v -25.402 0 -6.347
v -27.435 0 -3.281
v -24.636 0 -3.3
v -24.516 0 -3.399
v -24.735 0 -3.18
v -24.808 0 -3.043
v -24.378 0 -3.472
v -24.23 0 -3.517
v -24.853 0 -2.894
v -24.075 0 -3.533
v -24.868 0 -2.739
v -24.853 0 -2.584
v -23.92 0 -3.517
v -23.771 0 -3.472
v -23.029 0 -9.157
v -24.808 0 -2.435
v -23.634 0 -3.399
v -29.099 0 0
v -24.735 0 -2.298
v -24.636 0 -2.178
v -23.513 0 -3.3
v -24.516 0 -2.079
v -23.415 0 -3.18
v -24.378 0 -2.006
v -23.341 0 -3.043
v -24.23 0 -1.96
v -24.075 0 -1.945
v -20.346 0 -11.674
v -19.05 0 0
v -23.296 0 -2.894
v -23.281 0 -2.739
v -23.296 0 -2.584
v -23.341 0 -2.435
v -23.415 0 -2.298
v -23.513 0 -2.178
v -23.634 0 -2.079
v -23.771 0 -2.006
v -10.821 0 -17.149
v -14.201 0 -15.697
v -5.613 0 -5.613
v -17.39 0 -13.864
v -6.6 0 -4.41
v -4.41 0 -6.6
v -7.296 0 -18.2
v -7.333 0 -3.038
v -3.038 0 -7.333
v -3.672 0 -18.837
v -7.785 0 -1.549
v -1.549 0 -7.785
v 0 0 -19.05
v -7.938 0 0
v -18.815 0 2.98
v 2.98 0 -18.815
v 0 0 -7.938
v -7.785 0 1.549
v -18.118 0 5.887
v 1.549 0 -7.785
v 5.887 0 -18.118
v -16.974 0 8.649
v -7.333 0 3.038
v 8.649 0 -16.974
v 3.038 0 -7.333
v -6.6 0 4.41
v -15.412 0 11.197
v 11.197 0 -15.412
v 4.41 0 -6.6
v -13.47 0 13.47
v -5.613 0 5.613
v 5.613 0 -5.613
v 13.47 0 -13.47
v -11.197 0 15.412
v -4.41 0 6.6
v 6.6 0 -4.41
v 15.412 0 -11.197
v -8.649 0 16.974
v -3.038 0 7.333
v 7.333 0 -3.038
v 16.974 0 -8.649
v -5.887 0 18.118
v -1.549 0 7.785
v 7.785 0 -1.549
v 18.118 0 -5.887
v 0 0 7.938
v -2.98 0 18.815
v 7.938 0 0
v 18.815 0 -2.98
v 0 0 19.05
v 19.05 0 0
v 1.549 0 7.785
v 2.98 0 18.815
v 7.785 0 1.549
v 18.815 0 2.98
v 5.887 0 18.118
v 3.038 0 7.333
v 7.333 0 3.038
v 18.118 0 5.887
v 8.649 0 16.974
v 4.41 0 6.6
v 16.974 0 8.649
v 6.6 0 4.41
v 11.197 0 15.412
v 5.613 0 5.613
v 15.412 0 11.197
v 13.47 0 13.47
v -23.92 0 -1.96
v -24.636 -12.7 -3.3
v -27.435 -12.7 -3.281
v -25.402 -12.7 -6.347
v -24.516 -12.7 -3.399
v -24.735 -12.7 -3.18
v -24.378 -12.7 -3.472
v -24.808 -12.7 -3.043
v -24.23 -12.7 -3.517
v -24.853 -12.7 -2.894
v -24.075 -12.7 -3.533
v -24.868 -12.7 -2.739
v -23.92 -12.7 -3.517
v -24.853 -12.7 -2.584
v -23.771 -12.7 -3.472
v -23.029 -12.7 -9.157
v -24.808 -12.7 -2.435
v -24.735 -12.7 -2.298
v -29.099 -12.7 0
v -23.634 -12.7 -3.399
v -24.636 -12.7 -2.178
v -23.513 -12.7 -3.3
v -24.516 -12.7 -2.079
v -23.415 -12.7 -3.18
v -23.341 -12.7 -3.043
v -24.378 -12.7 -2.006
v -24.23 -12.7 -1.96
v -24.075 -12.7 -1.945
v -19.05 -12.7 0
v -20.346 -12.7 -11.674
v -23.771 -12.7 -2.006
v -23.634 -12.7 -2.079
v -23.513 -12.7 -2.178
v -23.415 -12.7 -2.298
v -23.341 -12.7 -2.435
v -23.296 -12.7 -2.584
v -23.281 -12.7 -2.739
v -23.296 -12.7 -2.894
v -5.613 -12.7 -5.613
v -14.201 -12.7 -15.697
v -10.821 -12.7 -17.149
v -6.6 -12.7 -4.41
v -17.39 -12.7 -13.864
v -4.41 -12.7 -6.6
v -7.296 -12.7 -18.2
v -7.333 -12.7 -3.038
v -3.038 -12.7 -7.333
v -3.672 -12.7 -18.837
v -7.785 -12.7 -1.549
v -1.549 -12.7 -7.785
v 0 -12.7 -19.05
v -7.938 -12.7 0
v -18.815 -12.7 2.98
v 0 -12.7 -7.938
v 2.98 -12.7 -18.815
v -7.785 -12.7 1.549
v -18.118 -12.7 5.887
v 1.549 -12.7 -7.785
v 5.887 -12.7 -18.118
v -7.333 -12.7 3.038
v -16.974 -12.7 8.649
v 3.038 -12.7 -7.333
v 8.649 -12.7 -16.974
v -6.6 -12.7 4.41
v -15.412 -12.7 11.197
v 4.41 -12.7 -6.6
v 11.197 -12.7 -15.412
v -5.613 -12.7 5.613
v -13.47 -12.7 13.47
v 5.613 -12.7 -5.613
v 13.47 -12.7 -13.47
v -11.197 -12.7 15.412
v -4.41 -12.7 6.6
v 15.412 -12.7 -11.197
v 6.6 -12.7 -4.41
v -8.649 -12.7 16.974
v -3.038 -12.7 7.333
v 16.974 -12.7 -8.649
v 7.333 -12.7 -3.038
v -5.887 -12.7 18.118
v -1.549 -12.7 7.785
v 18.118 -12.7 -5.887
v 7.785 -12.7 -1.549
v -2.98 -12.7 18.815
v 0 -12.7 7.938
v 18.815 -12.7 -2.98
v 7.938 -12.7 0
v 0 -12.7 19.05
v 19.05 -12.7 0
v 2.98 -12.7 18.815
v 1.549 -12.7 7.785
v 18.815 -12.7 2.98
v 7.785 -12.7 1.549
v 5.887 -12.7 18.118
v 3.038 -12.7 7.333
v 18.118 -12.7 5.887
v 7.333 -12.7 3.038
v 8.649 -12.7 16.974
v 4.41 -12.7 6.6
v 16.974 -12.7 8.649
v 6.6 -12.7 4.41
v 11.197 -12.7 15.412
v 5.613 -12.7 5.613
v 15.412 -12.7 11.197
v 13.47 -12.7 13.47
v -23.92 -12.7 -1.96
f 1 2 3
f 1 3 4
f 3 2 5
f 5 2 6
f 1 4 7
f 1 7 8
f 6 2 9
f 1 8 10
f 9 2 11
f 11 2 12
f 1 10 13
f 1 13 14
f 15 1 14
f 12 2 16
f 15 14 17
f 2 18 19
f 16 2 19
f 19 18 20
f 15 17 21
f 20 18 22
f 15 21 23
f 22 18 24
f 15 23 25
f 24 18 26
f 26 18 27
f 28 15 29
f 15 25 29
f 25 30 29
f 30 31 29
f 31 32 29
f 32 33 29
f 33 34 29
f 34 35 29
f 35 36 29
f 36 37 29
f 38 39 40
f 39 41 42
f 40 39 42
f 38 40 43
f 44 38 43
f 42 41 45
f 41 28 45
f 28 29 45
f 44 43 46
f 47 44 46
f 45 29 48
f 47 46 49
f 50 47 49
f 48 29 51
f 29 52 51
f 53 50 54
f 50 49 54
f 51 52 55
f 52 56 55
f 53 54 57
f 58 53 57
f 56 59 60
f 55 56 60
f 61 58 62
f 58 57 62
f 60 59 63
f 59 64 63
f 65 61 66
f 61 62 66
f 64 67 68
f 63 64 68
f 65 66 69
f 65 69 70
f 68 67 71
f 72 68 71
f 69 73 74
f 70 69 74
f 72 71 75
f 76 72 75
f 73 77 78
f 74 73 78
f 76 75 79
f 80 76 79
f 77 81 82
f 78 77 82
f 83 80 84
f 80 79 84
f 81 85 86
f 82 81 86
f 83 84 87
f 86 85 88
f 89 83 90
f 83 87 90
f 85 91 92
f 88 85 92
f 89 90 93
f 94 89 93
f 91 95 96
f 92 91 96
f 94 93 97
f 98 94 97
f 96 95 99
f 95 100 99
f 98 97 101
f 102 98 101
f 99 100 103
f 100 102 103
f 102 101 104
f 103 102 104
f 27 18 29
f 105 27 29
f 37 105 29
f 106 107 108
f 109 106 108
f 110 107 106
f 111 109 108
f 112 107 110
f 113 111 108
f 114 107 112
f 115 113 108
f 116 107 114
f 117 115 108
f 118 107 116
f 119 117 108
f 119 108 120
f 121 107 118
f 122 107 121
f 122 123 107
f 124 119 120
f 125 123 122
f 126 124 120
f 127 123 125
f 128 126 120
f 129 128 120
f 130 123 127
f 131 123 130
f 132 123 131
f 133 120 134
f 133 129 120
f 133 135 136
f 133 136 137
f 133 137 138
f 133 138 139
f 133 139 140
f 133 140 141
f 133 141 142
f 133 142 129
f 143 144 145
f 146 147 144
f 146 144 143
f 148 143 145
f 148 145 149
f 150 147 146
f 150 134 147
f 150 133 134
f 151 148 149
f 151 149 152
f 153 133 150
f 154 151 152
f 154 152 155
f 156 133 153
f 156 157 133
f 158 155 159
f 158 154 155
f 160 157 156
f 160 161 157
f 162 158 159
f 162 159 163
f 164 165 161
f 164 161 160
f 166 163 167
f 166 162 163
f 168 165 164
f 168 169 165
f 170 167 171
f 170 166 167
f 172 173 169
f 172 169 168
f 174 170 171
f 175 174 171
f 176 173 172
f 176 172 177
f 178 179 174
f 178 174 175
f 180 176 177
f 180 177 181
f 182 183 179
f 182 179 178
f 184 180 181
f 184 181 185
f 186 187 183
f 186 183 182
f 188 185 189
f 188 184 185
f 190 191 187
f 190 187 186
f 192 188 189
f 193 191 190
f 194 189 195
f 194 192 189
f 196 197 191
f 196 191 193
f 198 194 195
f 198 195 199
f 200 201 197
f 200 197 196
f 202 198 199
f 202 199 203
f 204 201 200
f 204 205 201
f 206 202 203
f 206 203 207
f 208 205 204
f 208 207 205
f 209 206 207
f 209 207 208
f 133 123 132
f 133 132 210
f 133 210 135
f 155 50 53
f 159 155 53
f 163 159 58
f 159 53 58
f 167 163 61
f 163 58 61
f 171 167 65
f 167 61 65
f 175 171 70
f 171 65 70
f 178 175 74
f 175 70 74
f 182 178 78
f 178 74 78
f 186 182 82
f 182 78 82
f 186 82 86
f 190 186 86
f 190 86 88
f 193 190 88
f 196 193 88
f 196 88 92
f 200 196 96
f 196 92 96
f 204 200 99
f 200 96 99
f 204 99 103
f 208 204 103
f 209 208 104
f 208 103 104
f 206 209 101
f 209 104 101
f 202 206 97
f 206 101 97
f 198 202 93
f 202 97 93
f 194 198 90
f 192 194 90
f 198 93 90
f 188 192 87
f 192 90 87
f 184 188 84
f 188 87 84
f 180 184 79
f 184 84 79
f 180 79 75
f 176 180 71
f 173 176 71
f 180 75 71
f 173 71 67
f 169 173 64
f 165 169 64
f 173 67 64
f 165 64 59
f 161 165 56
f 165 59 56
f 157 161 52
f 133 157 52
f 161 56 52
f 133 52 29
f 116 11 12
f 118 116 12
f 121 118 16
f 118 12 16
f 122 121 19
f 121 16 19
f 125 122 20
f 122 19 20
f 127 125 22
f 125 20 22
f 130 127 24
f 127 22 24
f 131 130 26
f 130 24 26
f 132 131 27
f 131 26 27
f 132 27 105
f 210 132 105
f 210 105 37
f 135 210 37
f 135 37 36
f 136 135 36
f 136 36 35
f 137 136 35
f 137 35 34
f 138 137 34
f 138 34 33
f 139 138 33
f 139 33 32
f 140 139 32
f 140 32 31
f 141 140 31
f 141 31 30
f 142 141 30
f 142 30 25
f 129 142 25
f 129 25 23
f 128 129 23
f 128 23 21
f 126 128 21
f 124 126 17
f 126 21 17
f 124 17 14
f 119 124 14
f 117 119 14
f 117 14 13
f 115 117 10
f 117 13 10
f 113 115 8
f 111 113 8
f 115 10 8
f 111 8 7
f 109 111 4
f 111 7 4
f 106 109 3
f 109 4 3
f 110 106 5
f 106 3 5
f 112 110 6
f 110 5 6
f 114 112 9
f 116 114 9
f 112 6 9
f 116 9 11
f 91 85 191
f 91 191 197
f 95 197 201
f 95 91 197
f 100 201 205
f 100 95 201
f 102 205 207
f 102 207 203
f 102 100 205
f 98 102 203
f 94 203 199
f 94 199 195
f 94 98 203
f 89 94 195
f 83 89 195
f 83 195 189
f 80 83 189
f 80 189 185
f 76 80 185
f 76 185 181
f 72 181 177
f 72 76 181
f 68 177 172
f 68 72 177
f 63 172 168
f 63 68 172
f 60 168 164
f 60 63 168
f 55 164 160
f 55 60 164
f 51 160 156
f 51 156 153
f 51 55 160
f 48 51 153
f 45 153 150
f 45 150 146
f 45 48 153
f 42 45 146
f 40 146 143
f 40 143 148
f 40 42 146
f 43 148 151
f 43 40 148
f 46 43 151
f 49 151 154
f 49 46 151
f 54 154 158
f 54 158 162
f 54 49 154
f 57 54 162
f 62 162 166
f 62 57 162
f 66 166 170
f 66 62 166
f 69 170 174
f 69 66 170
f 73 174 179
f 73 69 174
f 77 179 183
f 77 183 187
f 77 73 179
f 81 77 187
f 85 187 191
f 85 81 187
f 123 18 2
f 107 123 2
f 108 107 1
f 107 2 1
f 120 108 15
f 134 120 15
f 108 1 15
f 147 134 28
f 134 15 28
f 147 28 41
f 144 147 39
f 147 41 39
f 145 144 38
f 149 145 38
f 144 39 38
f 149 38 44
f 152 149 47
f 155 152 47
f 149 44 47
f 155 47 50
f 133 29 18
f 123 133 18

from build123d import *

# Parameters (mm, degrees)
F0_R           = 12.7
F0_R_2         = 7.9375
F1_DEPTH       = 12.7
F3_D           = 1.5875
F3_DEPTH       = 25.4
F3_CBORE_D     = 1.5875
F3_CBORE_DEPTH = 6.35
F3_TIP         = 0.4769331164


with BuildPart() as f1:
    # F0 (on Front) → F1 (new body)
    with BuildSketch(Plane.XZ):
        with BuildLine():
            ThreePointArc((0, -19.05), (13.4703841816, -13.4703841816), (19.05, 0))
            ThreePointArc((19.05, 0), (0, 19.05), (-19.05, 0))
            ThreePointArc((-19.05, 0), (-13.4703841816, -13.4703841816), (0, -19.05))
        make_face()
        Circle(F0_R, mode=Mode.SUBTRACT)
        Circle(F0_R)
        Circle(F0_R_2, mode=Mode.SUBTRACT)
        with BuildLine():
            ThreePointArc((0, -19.05), (-13.4703841816, -13.4703841816), (-19.05, 0))
            Line((-19.05, 0), (-29.099355663, 0))
            ThreePointArc((-29.099355663, 0), (-17.3901912008, -13.8639558425), (0, -19.05))
        make_face()
    extrude(amount=F1_DEPTH)

    # F3
    with Locations(Plane.XZ.offset(12.7)):
        with Locations((-24.0746778315, -2.738931682)):
            CounterBoreHole(F3_D / 2, F3_CBORE_D / 2, F3_CBORE_DEPTH, depth=F3_DEPTH)
            with Locations((0, 0, -(F3_DEPTH + F3_TIP / 2))):  # 118° drill point
                Cone(0, F3_D / 2, F3_TIP, mode=Mode.SUBTRACT)


solid = f1.part
